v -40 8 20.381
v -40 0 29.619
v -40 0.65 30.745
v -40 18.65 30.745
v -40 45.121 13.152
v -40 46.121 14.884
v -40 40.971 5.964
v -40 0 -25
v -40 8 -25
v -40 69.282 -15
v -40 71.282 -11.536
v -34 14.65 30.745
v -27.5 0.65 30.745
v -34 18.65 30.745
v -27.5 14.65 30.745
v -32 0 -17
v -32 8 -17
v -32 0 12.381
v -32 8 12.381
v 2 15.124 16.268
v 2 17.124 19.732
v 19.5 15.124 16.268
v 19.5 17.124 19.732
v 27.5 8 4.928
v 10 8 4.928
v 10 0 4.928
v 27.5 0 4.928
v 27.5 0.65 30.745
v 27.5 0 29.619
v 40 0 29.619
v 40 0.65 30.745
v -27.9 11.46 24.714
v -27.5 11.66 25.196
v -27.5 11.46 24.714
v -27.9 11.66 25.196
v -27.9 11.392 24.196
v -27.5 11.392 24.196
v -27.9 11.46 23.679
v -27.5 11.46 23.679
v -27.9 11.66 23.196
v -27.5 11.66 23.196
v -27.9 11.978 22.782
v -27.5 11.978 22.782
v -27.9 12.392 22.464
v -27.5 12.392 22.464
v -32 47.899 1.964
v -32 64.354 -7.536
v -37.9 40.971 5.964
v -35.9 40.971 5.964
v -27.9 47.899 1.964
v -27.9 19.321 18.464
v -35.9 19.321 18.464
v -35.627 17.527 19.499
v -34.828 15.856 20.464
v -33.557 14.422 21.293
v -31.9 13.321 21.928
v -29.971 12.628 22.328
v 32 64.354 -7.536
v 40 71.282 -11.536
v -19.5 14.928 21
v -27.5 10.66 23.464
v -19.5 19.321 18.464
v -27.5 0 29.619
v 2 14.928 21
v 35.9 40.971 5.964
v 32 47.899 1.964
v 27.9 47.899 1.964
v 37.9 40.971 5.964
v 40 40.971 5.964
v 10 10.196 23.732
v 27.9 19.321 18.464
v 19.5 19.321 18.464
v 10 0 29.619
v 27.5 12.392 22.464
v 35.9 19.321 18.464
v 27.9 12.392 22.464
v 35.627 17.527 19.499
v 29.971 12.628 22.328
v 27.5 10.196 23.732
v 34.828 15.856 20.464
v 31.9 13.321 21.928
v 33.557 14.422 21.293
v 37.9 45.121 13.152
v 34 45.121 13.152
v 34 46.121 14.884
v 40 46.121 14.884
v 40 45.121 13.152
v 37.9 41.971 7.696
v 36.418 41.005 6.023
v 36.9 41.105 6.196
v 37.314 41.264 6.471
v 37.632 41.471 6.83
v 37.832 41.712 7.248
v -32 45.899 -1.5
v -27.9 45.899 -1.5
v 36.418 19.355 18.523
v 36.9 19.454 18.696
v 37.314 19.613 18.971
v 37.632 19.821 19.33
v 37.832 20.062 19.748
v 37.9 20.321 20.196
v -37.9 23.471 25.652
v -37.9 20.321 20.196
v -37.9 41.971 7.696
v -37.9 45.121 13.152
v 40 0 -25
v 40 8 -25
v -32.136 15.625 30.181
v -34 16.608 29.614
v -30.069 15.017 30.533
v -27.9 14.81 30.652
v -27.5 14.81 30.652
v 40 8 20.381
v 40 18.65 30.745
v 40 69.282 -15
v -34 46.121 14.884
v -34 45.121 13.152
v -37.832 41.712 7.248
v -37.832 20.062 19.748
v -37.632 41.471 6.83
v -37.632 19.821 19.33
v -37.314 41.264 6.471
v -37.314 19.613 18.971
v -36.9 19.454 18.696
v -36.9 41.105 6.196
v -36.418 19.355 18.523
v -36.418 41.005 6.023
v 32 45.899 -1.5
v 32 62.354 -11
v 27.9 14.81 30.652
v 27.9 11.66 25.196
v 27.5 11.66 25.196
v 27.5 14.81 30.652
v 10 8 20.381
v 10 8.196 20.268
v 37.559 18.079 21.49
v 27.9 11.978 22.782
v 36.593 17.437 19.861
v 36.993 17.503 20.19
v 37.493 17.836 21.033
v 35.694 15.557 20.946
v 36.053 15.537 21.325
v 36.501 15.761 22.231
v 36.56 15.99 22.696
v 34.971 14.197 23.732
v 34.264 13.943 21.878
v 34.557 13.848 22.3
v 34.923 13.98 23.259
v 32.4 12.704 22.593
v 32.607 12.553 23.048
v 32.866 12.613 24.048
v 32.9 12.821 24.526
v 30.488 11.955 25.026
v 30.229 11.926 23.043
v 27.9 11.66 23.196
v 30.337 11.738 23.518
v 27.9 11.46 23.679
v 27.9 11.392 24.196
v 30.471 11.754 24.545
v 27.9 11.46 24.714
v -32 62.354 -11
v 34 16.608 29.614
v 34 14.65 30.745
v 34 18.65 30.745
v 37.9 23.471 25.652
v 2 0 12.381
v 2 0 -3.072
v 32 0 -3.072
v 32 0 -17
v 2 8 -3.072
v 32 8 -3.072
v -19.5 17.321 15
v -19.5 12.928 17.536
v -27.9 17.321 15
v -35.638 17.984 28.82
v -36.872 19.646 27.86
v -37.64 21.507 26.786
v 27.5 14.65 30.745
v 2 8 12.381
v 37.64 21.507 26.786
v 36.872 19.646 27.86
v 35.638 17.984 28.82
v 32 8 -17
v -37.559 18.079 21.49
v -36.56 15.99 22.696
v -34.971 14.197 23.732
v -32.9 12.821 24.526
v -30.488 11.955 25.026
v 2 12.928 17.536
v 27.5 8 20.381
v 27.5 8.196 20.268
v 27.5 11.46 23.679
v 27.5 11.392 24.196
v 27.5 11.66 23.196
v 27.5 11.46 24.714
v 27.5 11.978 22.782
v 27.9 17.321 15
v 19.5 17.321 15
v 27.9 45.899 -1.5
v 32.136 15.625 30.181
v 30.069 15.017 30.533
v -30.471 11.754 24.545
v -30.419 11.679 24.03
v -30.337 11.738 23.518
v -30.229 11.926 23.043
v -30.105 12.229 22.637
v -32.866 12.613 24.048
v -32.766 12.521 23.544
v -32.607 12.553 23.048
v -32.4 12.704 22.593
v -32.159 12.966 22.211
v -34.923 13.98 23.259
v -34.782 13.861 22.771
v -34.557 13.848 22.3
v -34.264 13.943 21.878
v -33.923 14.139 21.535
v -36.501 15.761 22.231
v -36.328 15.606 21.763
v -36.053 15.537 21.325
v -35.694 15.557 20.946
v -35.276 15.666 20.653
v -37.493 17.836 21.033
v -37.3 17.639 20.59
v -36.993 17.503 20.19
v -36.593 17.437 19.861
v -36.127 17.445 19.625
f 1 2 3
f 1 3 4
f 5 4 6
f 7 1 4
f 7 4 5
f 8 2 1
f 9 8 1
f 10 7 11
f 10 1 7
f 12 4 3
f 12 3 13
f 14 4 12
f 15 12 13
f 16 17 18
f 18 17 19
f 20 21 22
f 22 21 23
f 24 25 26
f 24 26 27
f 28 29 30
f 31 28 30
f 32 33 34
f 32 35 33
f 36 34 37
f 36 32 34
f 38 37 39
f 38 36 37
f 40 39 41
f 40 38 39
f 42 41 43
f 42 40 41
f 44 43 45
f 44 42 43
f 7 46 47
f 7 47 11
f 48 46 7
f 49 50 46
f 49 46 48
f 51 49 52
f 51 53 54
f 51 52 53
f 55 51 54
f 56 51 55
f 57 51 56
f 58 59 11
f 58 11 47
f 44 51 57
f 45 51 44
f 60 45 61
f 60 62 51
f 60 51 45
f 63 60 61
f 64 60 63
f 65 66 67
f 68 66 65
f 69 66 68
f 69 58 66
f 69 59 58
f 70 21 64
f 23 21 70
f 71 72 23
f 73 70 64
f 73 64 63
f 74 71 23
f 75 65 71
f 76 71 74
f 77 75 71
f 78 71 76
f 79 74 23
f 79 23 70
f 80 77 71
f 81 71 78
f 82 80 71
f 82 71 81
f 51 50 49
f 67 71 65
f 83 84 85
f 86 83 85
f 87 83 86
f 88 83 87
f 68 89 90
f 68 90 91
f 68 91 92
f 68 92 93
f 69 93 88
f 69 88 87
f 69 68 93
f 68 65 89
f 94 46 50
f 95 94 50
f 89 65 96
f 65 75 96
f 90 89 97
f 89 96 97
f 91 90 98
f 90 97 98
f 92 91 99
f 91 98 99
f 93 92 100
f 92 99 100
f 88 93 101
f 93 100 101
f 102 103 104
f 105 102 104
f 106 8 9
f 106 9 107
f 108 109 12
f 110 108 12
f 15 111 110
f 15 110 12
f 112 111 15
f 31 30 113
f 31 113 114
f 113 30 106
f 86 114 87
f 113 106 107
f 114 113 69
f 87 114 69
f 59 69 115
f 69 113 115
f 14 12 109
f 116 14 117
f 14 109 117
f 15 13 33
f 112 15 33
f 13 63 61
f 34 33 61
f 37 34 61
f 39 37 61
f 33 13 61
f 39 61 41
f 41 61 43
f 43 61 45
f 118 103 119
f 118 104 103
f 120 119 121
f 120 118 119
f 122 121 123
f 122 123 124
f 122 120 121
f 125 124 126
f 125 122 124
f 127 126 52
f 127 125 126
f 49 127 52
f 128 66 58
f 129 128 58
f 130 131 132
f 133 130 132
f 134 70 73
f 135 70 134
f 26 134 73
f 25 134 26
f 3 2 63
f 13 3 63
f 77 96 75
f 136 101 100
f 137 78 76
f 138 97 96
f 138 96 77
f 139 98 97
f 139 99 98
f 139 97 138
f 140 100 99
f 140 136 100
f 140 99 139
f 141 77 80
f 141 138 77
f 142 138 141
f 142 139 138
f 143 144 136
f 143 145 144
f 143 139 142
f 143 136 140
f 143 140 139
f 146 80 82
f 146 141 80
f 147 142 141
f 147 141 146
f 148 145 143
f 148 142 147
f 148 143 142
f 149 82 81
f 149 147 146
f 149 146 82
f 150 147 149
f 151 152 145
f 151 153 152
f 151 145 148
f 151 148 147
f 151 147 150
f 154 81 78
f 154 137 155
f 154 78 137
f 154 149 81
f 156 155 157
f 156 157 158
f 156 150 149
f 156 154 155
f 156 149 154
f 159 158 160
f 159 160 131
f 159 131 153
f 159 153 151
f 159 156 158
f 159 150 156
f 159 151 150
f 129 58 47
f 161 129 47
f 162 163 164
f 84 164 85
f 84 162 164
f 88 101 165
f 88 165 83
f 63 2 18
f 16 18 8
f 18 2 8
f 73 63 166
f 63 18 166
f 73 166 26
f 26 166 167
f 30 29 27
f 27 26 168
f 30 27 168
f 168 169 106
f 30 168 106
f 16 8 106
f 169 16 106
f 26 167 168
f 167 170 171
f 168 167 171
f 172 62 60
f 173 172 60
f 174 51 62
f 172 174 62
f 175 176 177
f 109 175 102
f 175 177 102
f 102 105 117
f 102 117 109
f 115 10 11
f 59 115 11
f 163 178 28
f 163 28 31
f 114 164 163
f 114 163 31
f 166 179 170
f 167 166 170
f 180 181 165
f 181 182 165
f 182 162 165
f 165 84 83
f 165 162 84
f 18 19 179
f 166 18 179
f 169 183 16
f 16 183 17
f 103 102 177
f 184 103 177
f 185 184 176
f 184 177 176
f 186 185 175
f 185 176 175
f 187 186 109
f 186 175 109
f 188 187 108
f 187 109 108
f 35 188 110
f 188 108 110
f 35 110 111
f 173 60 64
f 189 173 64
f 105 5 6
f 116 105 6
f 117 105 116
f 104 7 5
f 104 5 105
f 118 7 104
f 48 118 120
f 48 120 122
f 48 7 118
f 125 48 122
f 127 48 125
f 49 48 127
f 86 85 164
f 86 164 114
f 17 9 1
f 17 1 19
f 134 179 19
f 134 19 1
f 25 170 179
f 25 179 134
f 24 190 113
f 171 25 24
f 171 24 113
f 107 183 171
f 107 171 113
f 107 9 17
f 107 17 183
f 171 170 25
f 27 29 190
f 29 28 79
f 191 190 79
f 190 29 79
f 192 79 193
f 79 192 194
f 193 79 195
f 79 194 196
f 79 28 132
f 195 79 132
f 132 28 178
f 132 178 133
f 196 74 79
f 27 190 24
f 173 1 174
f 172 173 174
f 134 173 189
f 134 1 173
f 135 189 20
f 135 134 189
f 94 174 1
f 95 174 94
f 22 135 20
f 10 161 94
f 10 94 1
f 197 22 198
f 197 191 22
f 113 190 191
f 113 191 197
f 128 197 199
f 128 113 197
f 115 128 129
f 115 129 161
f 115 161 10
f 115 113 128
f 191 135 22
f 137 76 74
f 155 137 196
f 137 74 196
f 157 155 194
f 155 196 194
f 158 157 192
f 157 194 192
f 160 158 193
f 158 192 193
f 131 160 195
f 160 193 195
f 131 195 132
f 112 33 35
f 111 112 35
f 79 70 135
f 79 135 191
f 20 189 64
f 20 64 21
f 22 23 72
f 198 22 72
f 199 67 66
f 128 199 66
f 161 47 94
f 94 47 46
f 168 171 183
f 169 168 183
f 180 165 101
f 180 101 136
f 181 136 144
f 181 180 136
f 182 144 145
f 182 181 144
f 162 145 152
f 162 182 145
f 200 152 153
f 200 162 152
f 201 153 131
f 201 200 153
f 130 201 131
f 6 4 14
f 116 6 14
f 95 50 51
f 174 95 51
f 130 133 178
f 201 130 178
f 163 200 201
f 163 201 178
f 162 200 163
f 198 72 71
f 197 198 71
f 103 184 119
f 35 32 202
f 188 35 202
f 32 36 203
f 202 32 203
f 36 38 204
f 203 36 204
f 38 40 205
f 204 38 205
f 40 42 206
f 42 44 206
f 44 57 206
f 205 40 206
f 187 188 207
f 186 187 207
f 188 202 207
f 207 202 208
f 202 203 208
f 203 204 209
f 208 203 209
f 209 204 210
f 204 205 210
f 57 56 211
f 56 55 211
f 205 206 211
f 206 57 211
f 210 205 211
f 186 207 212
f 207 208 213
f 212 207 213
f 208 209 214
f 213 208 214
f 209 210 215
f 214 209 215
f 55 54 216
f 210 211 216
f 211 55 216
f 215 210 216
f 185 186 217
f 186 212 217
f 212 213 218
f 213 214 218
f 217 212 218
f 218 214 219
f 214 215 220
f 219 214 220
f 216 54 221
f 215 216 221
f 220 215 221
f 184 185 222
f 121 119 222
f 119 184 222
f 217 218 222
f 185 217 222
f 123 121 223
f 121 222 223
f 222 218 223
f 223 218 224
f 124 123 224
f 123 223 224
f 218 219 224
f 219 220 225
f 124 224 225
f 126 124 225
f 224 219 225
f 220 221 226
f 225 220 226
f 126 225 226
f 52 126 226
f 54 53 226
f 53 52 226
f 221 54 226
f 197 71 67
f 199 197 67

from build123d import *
from OCP.BRepFilletAPI import BRepFilletAPI_MakeChamfer

# Parameters (mm, degrees)
SKETCH1_W           = 80
SKETCH1_H           = 50
BOSS_EXTRUDE1_DEPTH = 8
BOSS_EXTRUDE2_DEPTH = 80
SKETCH3_W           = 2.1
SKETCH3_H           = 35
BOSS_EXTRUDE3_DEPTH = 8.3
FILLET1_R           = 10
FILLET2_R           = 2
BOSS_EXTRUDE4_DEPTH = 10
CHAMFER2_SIZE       = 17.320508076
CHAMFER2_SIZE_2     = 10
SKETCH5_W           = 12.5
SKETCH5_H           = 9.237604307
BOSS_EXTRUDE5_DEPTH = 8.3
SKETCH6_W           = 6
SKETCH6_H           = 47.309401077
BOSS_EXTRUDE6_DEPTH = 2
CHAMFER3_SIZE       = 9
CHAMFER3_SIZE2      = 15.588457268
SKETCH7_W           = 17.5
SKETCH7_H           = 11.773502692
CUT_EXTRUDE1_DEPTH  = 12
SKETCH8_W           = 17.5
SKETCH8_H           = 15
CUT_EXTRUDE2_DEPTH  = 12
CUT_EXTRUDE3_DEPTH  = 12
CUT_EXTRUDE4_DEPTH  = 4


with BuildPart() as part:
    # Sketch1 → Boss-Extrude1 (new body)
    with BuildSketch(Plane(origin=(0, 0, 0), x_dir=(1, 0, 0), z_dir=(0, 1, 0))):
        Rectangle(SKETCH1_W, SKETCH1_H)
    extrude(amount=BOSS_EXTRUDE1_DEPTH)

    # Sketch2 → Boss-Extrude2 (add)
    with BuildSketch(Plane(origin=(40, 0, 0), x_dir=(0, 0, -1), z_dir=(1, 0, 0))):
        Polygon((15, 69.282032303), (11.535898385, 71.282032303), (-25, 8), (-20.381197846, 8), align=None)
    extrude(amount=-BOSS_EXTRUDE2_DEPTH)

    # Sketch3 → Boss-Extrude3 (add)
    with BuildSketch(Plane(origin=(0, 12.825317547, 22.214101615), x_dir=(1, 0, 0), z_dir=(0, 0.5000000000000041, 0.8660254037844364))):
        with Locations((-38.95, 15)):
            Rectangle(SKETCH3_W, SKETCH3_H)
        Polygon((-27.5, -5.57179677), (-27.5, -2.5), (-37.9, -2.5), (-40, -2.5), (-40, -5.57179677), align=None)
        Polygon((40, -5.57179677), (40, -2.5), (37.9, -2.5), (27.5, -2.5), (27.5, -5.57179677), align=None)
        with Locations((38.95, 15)):
            Rectangle(SKETCH3_W, SKETCH3_H)
    extrude(amount=BOSS_EXTRUDE3_DEPTH)

    # Fillet1
    fillet1_edges = [part.edges().sort_by_distance(p)[0] for p in [
        (-37.9, 12.735254038, 27.058107041),
        (37.9, 12.735254038, 27.058107041),
    ]]
    fillet(fillet1_edges, radius=FILLET1_R)

    # Fillet2
    fillet2_edges = [part.edges().sort_by_distance(p)[0] for p in [
        (-27.7, 10.660254038, 23.464101615),
        (-37.9, 30.145825623, 12.214101615),
        (27.7, 10.660254038, 23.464101615),
        (37.9, 30.145825623, 12.214101615),
        (34.971067812, 13.196783719, 21.999635521),
        (-34.971067812, 13.196783719, 21.999635521),
    ]]
    fillet(fillet2_edges, radius=FILLET2_R)

    # Sketch4 → Boss-Extrude4 (add)
    with BuildSketch(Plane.XY.offset(25)):
        Polygon((40, 0), (40, 8), (27.5, 8), (-27.5, 8), (-40, 8), (-40, 0), align=None)
    extrude(amount=BOSS_EXTRUDE4_DEPTH)

    # Chamfer2
    # the kernel refuses this chamfer: 17.320508076, 10 mm, written as the material it takes off along each edge
    with BuildSketch(Plane(origin=(-84.809639706, 8, 35), x_dir=(0, -0.999813220622208, 0.019326765612700497), z_dir=(1, 0, 0))) as chamfer2_piece_1:
        Polygon((CHAMFER2_SIZE * 0.999813220604, CHAMFER2_SIZE * 0.0193267656124), (-CHAMFER2_SIZE_2 * 0.0193267656127, CHAMFER2_SIZE_2 * 0.999813220622), (0, 0), align=None)
    extrude(amount=169.619279412, mode=Mode.SUBTRACT)

    # Sketch5 → Boss-Extrude5 (add)
    with BuildSketch(Plane(origin=(0, 12.825317547, 22.214101615), x_dir=(1, 0, 0), z_dir=(0, 0.49999999999999656, 0.8660254037844407))):
        with Locations((-33.75, -10.190598924)):
            Rectangle(SKETCH5_W, SKETCH5_H)
        with Locations((33.75, -10.190598924)):
            Rectangle(SKETCH5_W, SKETCH5_H)
    extrude(amount=BOSS_EXTRUDE5_DEPTH)

    # Sketch6 → Boss-Extrude6 (add)
    with BuildSketch(Plane(origin=(0, 16.975317547, 29.402112467), x_dir=(1, 0, 0), z_dir=(0, 0.5000000000000041, 0.8660254037844364))):
        with Locations((-37, 8.845299461)):
            Rectangle(SKETCH6_W, SKETCH6_H)
        with Locations((37, 8.845299461)):
            Rectangle(SKETCH6_W, SKETCH6_H)
    extrude(amount=BOSS_EXTRUDE6_DEPTH)

    # Chamfer3: one chamfer whose edges measure the first distance from different faces: ONE call of the kernel's chamfer builder (chamfer() names one face for all edges)
    chamfer3_edges_1 = [part.edges().sort_by_distance(p)[0] for p in [
        (-37, 5.15, 38.538863812),
    ]]
    chamfer3_side_1 = [part.faces().sort_by_distance(p)[0] for p in [
        (-34.086933045, 2.341954644, 33.675186585),
    ]]
    chamfer3_edges_2 = [part.edges().sort_by_distance(p)[0] for p in [
        (37, 5.15, 38.538863812),
    ]]
    chamfer3_side_2 = [part.faces().sort_by_distance(p)[0] for p in [
        (34.086933045, 2.341954644, 33.675186585),
    ]]
    chamfer3 = BRepFilletAPI_MakeChamfer(part.part.solid().wrapped)
    for e in chamfer3_edges_1:
        chamfer3.Add(CHAMFER3_SIZE, CHAMFER3_SIZE2, e.wrapped, chamfer3_side_1[0].wrapped)  # the first distance lies on this face
    for e in chamfer3_edges_2:
        chamfer3.Add(CHAMFER3_SIZE, CHAMFER3_SIZE2, e.wrapped, chamfer3_side_2[0].wrapped)  # the first distance lies on this face
    add(Compound.cast(chamfer3.Shape()), mode=Mode.REPLACE)

    # Sketch7 → Cut-Extrude1 (cut)
    with BuildSketch(Plane(origin=(0, 12.825317547, 22.214101615), x_dir=(1, 0, 0), z_dir=(0, 0.49999999999999656, 0.8660254037844407))):
        with Locations((18.75, -8.922649731)):
            Rectangle(SKETCH7_W, SKETCH7_H)
    extrude(amount=-CUT_EXTRUDE1_DEPTH, mode=Mode.SUBTRACT)

    # Sketch8 → Cut-Extrude2 (cut)
    with BuildSketch(Plane(origin=(0, 8, 0), x_dir=(1, 0, 0), z_dir=(0, 1, 0))):
        with Locations((18.75, -12.42820323)):
            Rectangle(SKETCH8_W, SKETCH8_H)
    extrude(amount=-CUT_EXTRUDE2_DEPTH, mode=Mode.SUBTRACT)

    # Sketch9 → Cut-Extrude3 (cut)
    with BuildSketch(Plane(origin=(0, 8, 0), x_dir=(1, 0, 0), z_dir=(0, 1, 0))):
        Polygon((-32, -12.381197846), (2, -12.381197846), (2, 3.07179677), (32, 3.07179677), (32, 17), (-32, 17), align=None)
    extrude(amount=-CUT_EXTRUDE3_DEPTH, mode=Mode.SUBTRACT)

    # Sketch10 → Cut-Extrude4 (cut)
    with BuildSketch(Plane(origin=(0, 12.825317547, 22.214101615), x_dir=(1, 0, 0), z_dir=(0, 0.500000000000004, 0.8660254037844365))):
        Polygon((-19.5, 7.5), (-19.5, 2.42820323), (2, 2.42820323), (2, 4.964101615), (19.5, 4.964101615), (19.5, 7.5), (27.9, 7.5), (27.9, 40.5), (32, 40.5), (32, 59.5), (-32, 59.5), (-32, 40.5), (-27.9, 40.5), (-27.9, 7.5), align=None)
    extrude(amount=-CUT_EXTRUDE4_DEPTH, mode=Mode.SUBTRACT)


solid = part.part
